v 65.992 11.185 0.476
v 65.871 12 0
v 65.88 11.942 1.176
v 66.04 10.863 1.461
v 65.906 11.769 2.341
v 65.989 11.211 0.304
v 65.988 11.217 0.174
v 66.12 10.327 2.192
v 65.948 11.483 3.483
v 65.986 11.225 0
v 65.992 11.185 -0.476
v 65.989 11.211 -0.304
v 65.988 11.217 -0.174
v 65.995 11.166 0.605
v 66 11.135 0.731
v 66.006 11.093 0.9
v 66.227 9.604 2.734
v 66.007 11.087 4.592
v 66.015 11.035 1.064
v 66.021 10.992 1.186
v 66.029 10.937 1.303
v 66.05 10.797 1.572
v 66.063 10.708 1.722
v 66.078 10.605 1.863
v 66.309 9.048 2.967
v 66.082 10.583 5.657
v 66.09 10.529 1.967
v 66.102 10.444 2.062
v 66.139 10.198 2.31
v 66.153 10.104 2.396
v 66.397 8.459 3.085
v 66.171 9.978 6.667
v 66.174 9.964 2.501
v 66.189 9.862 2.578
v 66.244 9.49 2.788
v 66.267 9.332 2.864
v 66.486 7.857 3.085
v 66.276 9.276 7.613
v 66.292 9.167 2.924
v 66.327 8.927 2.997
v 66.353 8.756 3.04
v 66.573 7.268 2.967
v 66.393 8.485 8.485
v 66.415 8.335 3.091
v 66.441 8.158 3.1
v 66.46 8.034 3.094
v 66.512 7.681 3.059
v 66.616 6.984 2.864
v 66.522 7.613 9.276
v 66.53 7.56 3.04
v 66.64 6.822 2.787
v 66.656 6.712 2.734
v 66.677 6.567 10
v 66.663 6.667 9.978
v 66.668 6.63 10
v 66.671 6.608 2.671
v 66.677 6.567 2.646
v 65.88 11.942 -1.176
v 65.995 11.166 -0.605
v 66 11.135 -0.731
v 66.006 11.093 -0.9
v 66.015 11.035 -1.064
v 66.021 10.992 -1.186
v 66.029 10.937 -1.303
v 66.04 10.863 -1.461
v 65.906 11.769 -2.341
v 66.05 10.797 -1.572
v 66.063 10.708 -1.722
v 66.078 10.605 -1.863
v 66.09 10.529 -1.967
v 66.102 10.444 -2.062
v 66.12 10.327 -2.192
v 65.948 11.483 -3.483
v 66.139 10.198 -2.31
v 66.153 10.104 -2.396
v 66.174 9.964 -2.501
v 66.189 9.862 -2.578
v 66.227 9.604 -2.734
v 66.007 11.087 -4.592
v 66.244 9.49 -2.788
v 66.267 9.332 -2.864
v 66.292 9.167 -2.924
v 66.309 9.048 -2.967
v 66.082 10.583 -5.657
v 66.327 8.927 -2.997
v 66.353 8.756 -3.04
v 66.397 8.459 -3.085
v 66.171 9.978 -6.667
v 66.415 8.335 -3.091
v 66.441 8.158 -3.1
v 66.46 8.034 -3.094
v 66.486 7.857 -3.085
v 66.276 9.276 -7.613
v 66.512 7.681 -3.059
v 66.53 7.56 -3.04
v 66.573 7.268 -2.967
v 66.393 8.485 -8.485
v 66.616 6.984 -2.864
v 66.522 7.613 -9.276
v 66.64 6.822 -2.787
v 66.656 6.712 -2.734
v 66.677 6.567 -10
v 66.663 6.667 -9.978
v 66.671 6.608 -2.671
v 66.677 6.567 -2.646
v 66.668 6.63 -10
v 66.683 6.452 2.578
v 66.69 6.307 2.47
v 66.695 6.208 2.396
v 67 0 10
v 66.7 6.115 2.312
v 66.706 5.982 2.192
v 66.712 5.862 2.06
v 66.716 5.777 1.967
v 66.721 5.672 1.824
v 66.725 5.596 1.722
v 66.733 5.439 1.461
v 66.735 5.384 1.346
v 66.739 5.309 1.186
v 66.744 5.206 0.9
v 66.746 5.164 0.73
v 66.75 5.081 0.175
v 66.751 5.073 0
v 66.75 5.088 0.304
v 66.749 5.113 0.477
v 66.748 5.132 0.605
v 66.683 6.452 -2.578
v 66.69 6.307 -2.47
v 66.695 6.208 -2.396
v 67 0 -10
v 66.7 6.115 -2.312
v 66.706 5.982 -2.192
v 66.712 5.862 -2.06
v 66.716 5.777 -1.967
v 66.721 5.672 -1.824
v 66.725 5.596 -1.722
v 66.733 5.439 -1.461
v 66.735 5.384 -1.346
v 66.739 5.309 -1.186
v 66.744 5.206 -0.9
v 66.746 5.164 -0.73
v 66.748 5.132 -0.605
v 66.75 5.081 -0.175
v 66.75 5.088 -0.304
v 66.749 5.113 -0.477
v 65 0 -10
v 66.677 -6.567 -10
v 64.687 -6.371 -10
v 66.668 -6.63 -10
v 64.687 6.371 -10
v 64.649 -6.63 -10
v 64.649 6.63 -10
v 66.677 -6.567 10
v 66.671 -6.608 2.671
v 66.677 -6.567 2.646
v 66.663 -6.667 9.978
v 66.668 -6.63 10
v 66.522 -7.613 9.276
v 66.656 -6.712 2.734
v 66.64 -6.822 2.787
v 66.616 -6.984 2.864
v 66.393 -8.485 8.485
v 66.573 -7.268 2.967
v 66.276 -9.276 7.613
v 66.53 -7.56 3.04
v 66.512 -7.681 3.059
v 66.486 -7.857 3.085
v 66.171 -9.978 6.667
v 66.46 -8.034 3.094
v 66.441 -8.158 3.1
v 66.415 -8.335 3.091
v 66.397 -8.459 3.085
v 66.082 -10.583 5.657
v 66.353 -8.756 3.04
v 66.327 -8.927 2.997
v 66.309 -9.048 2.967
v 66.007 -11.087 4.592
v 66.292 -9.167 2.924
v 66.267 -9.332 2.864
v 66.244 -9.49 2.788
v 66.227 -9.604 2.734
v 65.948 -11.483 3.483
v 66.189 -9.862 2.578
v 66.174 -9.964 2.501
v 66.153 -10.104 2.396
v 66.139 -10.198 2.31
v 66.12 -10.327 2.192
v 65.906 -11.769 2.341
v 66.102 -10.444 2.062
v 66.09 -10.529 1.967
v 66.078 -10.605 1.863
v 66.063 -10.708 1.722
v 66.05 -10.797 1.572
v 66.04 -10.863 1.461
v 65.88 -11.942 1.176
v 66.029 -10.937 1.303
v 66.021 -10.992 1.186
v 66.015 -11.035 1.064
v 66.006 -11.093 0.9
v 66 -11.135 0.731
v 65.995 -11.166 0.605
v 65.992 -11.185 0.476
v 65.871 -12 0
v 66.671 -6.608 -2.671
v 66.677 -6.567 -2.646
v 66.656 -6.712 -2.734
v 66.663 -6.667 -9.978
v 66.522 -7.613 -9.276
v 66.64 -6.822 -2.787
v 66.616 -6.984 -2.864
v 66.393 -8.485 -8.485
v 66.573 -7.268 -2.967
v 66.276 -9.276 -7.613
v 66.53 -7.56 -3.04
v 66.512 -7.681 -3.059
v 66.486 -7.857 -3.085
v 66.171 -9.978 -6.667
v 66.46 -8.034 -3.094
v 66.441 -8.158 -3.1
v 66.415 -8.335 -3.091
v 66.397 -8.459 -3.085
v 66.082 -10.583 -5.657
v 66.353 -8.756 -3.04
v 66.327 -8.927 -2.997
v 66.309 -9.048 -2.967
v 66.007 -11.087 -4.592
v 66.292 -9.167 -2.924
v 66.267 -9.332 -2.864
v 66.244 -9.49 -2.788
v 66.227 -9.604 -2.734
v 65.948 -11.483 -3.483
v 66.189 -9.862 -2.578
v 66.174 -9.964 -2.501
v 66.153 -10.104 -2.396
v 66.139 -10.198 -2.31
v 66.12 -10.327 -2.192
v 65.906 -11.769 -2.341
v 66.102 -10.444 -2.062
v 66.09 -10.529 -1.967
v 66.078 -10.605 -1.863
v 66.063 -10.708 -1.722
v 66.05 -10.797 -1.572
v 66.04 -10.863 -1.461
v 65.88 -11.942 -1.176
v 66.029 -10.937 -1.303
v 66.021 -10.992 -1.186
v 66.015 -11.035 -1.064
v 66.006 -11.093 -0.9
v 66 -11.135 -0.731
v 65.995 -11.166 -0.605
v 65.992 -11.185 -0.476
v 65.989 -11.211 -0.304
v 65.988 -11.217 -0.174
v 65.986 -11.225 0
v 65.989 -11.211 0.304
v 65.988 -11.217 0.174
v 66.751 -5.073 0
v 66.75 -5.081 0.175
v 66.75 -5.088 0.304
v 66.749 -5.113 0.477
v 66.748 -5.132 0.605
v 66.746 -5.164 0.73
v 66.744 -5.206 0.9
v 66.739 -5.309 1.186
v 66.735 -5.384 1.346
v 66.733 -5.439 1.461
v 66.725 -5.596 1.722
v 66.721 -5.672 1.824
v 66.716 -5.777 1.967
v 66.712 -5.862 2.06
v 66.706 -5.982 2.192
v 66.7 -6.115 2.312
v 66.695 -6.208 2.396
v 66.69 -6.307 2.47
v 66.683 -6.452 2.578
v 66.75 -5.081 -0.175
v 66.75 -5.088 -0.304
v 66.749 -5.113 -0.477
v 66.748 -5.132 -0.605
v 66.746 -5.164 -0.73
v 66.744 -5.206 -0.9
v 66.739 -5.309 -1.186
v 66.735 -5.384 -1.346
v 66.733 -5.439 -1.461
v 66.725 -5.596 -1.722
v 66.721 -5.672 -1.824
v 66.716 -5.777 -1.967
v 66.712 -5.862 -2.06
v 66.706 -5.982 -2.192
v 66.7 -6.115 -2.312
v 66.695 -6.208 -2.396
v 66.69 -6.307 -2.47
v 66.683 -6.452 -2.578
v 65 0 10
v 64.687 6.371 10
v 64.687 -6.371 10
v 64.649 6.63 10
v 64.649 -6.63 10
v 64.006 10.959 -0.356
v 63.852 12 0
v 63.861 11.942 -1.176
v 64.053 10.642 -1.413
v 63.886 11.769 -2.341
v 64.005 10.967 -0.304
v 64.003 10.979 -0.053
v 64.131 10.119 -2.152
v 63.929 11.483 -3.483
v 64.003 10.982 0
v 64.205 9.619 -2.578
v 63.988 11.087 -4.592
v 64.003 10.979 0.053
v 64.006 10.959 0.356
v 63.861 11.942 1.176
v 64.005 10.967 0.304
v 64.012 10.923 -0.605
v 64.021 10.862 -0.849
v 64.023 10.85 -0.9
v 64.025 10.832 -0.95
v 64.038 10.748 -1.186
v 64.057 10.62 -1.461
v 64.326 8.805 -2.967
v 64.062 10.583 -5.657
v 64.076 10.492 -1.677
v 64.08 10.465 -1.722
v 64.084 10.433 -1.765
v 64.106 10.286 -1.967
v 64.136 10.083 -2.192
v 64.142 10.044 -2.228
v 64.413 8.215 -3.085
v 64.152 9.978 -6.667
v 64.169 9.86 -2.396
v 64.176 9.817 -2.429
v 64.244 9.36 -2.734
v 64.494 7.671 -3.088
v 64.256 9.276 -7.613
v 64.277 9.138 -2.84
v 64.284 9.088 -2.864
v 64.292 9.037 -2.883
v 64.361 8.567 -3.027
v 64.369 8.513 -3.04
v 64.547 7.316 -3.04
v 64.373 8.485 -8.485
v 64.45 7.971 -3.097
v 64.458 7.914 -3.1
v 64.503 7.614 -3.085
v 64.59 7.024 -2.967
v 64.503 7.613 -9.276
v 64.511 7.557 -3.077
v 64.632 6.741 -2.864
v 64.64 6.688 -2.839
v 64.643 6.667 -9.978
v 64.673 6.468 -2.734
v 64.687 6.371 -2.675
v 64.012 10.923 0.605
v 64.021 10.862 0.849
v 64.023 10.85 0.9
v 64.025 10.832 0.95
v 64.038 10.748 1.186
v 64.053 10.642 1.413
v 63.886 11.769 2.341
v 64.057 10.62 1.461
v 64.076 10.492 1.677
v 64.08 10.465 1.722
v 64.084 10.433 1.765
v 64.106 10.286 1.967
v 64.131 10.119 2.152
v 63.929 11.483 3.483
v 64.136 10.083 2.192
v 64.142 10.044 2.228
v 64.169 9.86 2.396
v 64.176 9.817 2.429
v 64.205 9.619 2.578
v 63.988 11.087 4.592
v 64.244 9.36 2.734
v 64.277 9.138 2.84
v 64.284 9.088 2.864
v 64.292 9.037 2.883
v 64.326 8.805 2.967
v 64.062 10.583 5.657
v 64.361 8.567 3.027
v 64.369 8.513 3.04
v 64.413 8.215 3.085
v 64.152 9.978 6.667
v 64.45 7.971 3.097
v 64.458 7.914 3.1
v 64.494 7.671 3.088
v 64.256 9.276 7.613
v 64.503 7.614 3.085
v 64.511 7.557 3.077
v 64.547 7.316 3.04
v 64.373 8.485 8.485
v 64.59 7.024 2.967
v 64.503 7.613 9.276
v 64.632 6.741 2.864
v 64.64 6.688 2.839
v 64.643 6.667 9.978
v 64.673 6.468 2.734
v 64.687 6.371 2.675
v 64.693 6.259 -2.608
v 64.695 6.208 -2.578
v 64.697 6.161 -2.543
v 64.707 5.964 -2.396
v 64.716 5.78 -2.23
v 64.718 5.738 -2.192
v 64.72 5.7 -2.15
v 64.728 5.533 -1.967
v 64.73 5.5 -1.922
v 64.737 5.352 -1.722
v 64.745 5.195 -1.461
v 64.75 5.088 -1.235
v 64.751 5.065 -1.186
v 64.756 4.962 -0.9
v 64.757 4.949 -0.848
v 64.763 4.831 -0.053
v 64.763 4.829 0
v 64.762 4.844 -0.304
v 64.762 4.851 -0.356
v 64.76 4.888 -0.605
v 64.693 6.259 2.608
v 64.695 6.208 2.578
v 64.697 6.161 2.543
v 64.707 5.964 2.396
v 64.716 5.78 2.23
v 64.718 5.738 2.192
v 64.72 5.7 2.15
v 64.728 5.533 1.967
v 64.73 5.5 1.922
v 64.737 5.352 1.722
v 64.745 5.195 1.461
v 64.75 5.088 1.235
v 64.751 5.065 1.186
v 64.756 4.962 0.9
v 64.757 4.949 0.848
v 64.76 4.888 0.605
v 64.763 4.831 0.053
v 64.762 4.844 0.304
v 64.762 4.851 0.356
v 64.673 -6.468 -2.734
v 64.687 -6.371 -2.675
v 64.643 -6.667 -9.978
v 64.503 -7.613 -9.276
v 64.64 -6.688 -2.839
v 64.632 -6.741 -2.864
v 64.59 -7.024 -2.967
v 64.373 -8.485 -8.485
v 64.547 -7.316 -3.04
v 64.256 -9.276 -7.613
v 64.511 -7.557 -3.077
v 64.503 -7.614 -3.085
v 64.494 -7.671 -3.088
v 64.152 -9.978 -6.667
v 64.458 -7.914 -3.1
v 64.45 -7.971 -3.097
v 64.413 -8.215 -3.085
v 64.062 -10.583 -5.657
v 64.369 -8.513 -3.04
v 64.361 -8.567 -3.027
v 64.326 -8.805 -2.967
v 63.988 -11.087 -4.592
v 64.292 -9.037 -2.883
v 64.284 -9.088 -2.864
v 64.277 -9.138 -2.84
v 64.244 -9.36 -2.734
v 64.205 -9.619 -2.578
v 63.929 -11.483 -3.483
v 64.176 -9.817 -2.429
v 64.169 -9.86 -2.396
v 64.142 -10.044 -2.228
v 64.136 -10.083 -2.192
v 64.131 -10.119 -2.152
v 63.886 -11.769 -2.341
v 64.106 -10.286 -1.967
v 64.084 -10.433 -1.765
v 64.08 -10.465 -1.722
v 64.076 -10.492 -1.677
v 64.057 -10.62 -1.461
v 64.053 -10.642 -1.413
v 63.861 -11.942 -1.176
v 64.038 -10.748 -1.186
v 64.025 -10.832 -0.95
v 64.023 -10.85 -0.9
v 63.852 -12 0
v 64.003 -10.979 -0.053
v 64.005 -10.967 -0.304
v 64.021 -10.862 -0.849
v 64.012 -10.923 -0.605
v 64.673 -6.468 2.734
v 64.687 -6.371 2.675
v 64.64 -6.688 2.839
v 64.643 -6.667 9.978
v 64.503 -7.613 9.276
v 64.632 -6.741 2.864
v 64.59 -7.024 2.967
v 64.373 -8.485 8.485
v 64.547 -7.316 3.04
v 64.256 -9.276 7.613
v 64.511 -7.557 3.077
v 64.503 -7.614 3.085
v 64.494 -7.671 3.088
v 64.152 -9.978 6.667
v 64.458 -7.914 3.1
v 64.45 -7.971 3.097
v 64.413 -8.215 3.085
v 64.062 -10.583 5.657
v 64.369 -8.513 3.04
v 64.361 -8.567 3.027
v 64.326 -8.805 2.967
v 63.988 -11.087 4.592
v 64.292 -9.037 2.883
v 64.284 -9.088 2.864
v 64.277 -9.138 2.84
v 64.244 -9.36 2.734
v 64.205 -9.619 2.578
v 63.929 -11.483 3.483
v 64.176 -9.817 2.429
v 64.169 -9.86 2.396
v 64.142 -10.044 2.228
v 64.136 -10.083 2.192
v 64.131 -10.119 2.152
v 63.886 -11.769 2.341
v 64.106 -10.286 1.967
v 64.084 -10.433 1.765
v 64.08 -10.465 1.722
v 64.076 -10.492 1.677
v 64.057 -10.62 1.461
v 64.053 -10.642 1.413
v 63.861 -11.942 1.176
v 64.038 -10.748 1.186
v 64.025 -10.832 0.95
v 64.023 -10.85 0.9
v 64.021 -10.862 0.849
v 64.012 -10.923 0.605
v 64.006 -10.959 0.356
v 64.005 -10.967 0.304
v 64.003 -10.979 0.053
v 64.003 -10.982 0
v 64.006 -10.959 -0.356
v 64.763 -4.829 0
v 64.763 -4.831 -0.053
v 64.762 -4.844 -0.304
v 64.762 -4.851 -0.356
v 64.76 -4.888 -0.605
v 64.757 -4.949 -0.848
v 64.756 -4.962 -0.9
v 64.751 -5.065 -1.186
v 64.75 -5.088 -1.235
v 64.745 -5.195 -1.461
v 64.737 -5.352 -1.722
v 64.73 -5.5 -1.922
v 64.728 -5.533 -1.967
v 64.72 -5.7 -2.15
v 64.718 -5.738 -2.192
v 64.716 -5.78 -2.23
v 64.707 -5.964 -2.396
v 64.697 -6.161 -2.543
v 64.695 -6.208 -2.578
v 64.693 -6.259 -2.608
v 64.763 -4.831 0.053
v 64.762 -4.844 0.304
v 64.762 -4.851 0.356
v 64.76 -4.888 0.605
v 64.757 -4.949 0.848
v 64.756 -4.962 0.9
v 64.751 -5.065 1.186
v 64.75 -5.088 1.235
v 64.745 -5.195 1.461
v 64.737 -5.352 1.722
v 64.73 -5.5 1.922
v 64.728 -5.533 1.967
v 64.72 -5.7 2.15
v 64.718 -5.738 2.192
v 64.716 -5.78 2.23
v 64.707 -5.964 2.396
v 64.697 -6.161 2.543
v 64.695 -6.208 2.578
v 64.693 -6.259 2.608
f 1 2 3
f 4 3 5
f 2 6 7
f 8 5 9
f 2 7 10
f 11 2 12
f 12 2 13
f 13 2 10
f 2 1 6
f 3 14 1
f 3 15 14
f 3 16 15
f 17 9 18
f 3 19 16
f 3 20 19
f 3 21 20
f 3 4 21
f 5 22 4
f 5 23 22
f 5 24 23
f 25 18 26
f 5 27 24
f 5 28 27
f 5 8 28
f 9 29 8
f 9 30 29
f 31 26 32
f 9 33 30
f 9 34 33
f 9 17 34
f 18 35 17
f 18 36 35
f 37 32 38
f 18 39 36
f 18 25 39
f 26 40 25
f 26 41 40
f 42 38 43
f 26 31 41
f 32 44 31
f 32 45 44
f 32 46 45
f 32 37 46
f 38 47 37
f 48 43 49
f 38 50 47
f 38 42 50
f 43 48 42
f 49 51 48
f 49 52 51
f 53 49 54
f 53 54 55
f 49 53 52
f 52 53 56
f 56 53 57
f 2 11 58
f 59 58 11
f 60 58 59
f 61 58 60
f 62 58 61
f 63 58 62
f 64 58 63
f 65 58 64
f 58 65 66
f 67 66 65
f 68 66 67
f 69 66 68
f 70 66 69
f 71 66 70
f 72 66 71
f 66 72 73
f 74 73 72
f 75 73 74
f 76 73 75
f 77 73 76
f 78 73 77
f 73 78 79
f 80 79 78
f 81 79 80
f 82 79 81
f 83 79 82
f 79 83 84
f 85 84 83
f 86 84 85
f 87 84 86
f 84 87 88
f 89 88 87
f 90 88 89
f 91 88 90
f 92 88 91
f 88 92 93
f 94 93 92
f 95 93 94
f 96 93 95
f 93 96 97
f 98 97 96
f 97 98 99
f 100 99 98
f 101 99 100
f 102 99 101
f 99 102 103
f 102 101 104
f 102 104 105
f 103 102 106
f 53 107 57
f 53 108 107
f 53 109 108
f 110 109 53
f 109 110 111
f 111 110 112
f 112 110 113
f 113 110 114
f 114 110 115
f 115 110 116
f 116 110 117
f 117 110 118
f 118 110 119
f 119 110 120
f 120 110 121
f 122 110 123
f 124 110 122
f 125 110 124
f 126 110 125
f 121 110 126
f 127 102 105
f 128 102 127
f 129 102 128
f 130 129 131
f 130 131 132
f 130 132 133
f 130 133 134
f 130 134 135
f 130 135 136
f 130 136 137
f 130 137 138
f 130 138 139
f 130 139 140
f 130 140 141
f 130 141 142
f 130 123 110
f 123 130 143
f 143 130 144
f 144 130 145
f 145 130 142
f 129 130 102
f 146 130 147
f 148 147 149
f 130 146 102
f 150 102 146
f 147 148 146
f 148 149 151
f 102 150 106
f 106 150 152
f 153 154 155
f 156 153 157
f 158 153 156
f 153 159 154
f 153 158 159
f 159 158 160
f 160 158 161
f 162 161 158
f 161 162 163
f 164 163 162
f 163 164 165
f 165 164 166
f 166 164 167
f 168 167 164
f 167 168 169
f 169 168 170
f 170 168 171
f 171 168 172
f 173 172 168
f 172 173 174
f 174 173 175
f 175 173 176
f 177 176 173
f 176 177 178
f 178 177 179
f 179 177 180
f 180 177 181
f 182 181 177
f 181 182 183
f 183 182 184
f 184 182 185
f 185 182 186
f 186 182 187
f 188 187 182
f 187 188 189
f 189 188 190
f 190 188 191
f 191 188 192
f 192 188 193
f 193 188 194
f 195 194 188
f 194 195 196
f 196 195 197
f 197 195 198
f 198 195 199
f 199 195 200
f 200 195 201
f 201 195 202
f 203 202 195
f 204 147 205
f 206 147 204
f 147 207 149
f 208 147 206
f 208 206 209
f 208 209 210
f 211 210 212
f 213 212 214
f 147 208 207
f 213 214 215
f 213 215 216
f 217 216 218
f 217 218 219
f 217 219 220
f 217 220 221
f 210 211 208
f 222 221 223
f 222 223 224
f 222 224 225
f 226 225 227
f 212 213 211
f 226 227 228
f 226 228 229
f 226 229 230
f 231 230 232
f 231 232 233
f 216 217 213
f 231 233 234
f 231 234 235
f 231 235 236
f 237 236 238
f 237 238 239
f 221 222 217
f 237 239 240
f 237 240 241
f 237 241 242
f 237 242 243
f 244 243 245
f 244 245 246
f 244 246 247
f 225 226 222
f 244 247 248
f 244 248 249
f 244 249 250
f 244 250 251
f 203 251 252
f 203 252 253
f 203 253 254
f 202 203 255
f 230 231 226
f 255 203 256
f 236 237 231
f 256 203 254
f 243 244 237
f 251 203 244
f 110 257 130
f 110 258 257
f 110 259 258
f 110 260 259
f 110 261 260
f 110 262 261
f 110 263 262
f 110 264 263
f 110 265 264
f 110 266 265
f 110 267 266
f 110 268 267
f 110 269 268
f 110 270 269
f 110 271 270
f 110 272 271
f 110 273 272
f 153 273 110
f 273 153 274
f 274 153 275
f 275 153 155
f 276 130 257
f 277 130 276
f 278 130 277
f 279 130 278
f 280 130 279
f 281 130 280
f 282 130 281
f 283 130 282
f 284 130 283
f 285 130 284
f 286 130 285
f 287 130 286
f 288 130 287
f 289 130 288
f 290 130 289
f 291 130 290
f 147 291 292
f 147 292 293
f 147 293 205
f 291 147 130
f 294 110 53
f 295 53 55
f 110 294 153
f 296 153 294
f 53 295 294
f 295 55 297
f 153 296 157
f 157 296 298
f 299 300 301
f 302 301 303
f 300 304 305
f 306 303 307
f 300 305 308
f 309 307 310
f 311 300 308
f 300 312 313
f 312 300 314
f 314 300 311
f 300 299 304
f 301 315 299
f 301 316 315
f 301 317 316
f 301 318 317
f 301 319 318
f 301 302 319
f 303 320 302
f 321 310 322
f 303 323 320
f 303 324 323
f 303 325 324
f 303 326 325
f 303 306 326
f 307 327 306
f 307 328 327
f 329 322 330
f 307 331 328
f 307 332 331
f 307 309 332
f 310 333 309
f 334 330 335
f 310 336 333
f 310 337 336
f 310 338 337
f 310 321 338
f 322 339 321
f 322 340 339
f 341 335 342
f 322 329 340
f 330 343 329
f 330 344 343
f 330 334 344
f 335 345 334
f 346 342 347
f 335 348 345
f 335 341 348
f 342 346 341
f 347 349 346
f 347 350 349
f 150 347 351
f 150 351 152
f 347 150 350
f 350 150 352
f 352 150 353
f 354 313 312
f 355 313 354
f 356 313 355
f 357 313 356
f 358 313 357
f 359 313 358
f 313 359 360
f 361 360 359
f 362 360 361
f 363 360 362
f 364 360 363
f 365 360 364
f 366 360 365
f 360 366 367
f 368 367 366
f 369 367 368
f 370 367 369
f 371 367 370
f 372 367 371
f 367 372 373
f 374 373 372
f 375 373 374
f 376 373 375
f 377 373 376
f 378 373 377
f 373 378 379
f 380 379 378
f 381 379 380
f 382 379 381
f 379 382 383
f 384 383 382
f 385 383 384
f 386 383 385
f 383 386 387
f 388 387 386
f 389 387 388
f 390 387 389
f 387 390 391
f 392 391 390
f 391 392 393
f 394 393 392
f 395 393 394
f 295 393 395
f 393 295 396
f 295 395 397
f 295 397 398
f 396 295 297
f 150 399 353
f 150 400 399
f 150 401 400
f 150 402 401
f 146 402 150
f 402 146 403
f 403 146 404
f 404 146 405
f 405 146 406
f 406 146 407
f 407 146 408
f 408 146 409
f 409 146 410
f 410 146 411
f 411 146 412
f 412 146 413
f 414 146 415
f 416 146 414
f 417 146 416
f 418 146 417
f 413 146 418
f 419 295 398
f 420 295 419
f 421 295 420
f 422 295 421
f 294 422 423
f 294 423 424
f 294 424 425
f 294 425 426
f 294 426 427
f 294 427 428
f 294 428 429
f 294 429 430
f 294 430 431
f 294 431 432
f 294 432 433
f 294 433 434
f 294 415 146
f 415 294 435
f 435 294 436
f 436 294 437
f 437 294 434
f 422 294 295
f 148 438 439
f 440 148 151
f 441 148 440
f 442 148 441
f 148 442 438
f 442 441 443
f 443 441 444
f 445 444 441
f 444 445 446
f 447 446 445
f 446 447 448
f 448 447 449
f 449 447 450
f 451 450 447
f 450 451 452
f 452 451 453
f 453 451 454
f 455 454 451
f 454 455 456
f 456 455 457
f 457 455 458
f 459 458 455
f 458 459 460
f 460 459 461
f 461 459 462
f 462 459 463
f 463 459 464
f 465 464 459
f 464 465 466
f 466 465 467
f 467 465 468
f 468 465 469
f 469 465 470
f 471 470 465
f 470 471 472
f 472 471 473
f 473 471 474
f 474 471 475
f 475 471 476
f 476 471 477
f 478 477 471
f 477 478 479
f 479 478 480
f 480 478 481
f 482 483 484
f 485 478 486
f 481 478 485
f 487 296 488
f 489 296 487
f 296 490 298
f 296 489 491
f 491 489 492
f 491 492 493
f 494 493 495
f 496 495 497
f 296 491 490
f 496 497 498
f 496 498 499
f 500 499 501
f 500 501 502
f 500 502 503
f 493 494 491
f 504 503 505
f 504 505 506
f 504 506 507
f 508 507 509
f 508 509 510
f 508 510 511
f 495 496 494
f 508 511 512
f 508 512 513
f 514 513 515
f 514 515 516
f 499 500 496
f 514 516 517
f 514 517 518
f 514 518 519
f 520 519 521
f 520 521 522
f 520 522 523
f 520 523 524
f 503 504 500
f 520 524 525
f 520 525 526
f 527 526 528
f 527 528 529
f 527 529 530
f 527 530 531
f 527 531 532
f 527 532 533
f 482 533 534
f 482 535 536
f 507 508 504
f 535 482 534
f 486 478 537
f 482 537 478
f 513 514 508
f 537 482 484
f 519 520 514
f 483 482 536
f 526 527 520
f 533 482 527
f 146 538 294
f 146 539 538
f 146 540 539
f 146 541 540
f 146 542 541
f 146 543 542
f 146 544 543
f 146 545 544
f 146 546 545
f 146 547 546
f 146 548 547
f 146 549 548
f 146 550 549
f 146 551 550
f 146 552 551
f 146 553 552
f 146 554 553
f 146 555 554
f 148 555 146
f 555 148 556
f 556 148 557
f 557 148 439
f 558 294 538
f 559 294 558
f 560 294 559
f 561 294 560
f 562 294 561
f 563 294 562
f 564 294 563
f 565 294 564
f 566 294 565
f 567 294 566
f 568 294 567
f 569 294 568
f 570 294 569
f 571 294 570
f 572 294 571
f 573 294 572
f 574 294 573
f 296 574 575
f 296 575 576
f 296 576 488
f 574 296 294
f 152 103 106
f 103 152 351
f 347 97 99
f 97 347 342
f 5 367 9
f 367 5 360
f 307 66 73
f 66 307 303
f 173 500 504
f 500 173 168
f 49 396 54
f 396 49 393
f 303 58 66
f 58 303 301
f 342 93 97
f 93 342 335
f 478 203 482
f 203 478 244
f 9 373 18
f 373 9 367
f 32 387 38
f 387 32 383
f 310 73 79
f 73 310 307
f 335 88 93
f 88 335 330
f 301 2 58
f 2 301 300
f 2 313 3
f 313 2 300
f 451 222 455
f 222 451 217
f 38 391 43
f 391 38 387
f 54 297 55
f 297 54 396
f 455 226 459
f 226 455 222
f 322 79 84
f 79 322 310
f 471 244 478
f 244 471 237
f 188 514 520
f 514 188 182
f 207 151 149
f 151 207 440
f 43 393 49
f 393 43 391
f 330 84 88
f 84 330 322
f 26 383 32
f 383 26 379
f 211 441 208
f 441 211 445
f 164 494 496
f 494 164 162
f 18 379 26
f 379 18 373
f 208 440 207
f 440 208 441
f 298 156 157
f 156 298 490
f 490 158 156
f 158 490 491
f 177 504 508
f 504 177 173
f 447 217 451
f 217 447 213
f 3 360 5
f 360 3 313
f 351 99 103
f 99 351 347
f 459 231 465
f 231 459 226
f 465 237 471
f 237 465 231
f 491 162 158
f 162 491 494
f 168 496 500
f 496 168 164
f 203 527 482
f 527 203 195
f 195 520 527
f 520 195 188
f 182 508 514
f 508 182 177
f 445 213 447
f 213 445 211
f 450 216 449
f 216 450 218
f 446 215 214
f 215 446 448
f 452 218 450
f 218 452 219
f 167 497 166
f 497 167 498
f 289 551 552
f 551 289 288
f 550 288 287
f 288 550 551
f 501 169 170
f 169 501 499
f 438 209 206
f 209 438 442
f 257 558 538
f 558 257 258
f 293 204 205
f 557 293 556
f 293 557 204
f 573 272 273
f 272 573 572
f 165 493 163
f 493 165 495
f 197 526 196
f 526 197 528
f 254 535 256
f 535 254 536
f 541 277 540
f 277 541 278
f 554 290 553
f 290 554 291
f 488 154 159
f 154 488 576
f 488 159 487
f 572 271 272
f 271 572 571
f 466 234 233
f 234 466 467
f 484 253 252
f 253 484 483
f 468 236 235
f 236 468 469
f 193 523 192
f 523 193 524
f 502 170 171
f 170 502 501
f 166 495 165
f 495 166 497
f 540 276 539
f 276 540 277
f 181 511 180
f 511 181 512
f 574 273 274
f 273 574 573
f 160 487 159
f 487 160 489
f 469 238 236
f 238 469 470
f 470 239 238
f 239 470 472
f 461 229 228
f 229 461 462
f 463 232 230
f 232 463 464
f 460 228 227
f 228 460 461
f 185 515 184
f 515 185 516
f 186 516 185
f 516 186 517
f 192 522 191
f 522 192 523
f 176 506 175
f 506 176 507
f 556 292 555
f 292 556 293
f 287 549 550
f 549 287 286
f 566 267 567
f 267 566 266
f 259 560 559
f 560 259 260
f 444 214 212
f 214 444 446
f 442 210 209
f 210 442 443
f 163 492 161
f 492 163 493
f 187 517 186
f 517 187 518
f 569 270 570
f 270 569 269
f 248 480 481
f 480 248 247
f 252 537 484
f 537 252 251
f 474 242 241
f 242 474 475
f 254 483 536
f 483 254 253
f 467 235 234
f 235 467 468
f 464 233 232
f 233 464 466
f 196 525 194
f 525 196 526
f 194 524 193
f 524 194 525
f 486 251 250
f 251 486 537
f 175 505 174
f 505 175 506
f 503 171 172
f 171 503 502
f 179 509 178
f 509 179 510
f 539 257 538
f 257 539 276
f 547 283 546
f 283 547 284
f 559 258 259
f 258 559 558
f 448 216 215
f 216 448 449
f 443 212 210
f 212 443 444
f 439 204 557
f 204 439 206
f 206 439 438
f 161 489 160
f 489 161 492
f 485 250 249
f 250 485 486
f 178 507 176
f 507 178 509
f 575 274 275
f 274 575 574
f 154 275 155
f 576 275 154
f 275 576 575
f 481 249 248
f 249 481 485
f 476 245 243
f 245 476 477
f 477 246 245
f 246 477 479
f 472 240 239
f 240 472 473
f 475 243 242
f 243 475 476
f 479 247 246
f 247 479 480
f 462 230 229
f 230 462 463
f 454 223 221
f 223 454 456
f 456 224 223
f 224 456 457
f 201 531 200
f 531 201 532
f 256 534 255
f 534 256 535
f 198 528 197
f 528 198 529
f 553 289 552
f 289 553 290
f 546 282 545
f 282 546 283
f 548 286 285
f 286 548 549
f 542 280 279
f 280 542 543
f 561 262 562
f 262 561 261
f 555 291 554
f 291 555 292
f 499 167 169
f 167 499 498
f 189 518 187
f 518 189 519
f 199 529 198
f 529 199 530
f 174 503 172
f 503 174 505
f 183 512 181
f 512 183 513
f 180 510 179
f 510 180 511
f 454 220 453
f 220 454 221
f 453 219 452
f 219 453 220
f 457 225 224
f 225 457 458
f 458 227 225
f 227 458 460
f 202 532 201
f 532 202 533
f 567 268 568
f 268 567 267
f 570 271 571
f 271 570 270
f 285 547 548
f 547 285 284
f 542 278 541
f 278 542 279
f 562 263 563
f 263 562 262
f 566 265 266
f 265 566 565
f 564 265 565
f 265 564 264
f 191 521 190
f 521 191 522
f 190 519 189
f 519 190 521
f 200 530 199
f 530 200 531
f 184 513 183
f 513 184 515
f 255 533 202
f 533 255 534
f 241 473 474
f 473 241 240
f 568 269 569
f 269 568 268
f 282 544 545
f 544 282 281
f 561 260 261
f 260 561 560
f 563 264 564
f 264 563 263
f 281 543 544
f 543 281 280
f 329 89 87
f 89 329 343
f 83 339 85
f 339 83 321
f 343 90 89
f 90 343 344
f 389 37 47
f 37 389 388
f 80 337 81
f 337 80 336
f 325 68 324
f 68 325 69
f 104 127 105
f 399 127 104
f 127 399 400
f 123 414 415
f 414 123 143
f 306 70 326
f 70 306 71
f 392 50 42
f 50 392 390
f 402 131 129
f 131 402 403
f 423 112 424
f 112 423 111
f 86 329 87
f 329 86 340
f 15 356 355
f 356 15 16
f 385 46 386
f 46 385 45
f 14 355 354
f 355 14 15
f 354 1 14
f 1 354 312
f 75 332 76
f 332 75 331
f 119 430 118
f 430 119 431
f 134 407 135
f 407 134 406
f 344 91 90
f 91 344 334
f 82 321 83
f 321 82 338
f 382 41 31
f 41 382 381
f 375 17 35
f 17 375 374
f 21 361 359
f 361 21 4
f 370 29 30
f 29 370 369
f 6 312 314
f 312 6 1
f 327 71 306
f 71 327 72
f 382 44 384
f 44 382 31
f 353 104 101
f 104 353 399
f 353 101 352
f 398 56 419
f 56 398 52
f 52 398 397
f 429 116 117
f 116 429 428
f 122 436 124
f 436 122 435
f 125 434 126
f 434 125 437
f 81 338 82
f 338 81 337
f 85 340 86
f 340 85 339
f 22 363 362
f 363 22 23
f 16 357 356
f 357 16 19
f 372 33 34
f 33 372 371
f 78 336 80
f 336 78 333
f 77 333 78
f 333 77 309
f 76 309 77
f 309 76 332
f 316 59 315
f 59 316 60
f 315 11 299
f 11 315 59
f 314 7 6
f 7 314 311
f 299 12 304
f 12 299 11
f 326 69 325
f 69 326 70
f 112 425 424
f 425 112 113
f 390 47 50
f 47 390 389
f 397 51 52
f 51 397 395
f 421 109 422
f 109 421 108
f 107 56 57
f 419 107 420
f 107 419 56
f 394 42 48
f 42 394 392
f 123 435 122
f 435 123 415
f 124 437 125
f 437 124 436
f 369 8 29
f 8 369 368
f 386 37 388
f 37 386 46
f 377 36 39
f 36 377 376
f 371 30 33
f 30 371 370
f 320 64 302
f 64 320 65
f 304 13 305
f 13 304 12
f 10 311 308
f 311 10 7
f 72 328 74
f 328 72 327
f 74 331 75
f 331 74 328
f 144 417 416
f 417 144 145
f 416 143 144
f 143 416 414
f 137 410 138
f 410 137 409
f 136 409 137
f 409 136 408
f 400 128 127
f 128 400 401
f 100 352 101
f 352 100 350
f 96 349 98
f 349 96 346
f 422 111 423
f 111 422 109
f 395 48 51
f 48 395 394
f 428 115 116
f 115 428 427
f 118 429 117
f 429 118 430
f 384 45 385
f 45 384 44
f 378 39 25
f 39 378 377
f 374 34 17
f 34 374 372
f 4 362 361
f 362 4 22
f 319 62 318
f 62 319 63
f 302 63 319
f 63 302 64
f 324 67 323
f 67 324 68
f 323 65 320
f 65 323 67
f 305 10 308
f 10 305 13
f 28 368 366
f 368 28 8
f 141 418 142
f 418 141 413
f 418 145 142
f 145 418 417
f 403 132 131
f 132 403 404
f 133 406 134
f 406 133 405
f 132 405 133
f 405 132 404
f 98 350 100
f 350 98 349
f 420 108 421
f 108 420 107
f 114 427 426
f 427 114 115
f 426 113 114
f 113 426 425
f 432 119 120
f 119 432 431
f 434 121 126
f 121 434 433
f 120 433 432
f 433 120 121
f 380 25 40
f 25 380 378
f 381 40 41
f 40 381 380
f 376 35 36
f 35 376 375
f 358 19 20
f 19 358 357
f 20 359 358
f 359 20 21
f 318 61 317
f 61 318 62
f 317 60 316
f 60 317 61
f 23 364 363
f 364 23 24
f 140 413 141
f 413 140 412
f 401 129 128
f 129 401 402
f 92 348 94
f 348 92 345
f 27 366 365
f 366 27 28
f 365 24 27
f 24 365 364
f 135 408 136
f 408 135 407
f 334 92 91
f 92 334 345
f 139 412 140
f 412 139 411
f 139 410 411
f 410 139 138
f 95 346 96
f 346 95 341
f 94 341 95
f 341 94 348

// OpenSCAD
$fn=64;



difference() {
  intersection() {
    translate([0,0,-10]) mainRing();
    rotate([0,90,0]) cylinder(r=12,h=1000);
  }
  
  rotate([0,0,-7]) translate([64,0,0])  rotate([0,90,0]) cylinder(r=3.1,h=5);
  rotate([0,0,7]) translate([64,0,0])  rotate([0,90,0]) cylinder(r=3.1,h=5);
}

module mainRing() {
  difference() {
    cylinder(r=67,h=20);
    translate([0,0,-0.1]) cylinder(r=65,h=20.2);
  }
}
